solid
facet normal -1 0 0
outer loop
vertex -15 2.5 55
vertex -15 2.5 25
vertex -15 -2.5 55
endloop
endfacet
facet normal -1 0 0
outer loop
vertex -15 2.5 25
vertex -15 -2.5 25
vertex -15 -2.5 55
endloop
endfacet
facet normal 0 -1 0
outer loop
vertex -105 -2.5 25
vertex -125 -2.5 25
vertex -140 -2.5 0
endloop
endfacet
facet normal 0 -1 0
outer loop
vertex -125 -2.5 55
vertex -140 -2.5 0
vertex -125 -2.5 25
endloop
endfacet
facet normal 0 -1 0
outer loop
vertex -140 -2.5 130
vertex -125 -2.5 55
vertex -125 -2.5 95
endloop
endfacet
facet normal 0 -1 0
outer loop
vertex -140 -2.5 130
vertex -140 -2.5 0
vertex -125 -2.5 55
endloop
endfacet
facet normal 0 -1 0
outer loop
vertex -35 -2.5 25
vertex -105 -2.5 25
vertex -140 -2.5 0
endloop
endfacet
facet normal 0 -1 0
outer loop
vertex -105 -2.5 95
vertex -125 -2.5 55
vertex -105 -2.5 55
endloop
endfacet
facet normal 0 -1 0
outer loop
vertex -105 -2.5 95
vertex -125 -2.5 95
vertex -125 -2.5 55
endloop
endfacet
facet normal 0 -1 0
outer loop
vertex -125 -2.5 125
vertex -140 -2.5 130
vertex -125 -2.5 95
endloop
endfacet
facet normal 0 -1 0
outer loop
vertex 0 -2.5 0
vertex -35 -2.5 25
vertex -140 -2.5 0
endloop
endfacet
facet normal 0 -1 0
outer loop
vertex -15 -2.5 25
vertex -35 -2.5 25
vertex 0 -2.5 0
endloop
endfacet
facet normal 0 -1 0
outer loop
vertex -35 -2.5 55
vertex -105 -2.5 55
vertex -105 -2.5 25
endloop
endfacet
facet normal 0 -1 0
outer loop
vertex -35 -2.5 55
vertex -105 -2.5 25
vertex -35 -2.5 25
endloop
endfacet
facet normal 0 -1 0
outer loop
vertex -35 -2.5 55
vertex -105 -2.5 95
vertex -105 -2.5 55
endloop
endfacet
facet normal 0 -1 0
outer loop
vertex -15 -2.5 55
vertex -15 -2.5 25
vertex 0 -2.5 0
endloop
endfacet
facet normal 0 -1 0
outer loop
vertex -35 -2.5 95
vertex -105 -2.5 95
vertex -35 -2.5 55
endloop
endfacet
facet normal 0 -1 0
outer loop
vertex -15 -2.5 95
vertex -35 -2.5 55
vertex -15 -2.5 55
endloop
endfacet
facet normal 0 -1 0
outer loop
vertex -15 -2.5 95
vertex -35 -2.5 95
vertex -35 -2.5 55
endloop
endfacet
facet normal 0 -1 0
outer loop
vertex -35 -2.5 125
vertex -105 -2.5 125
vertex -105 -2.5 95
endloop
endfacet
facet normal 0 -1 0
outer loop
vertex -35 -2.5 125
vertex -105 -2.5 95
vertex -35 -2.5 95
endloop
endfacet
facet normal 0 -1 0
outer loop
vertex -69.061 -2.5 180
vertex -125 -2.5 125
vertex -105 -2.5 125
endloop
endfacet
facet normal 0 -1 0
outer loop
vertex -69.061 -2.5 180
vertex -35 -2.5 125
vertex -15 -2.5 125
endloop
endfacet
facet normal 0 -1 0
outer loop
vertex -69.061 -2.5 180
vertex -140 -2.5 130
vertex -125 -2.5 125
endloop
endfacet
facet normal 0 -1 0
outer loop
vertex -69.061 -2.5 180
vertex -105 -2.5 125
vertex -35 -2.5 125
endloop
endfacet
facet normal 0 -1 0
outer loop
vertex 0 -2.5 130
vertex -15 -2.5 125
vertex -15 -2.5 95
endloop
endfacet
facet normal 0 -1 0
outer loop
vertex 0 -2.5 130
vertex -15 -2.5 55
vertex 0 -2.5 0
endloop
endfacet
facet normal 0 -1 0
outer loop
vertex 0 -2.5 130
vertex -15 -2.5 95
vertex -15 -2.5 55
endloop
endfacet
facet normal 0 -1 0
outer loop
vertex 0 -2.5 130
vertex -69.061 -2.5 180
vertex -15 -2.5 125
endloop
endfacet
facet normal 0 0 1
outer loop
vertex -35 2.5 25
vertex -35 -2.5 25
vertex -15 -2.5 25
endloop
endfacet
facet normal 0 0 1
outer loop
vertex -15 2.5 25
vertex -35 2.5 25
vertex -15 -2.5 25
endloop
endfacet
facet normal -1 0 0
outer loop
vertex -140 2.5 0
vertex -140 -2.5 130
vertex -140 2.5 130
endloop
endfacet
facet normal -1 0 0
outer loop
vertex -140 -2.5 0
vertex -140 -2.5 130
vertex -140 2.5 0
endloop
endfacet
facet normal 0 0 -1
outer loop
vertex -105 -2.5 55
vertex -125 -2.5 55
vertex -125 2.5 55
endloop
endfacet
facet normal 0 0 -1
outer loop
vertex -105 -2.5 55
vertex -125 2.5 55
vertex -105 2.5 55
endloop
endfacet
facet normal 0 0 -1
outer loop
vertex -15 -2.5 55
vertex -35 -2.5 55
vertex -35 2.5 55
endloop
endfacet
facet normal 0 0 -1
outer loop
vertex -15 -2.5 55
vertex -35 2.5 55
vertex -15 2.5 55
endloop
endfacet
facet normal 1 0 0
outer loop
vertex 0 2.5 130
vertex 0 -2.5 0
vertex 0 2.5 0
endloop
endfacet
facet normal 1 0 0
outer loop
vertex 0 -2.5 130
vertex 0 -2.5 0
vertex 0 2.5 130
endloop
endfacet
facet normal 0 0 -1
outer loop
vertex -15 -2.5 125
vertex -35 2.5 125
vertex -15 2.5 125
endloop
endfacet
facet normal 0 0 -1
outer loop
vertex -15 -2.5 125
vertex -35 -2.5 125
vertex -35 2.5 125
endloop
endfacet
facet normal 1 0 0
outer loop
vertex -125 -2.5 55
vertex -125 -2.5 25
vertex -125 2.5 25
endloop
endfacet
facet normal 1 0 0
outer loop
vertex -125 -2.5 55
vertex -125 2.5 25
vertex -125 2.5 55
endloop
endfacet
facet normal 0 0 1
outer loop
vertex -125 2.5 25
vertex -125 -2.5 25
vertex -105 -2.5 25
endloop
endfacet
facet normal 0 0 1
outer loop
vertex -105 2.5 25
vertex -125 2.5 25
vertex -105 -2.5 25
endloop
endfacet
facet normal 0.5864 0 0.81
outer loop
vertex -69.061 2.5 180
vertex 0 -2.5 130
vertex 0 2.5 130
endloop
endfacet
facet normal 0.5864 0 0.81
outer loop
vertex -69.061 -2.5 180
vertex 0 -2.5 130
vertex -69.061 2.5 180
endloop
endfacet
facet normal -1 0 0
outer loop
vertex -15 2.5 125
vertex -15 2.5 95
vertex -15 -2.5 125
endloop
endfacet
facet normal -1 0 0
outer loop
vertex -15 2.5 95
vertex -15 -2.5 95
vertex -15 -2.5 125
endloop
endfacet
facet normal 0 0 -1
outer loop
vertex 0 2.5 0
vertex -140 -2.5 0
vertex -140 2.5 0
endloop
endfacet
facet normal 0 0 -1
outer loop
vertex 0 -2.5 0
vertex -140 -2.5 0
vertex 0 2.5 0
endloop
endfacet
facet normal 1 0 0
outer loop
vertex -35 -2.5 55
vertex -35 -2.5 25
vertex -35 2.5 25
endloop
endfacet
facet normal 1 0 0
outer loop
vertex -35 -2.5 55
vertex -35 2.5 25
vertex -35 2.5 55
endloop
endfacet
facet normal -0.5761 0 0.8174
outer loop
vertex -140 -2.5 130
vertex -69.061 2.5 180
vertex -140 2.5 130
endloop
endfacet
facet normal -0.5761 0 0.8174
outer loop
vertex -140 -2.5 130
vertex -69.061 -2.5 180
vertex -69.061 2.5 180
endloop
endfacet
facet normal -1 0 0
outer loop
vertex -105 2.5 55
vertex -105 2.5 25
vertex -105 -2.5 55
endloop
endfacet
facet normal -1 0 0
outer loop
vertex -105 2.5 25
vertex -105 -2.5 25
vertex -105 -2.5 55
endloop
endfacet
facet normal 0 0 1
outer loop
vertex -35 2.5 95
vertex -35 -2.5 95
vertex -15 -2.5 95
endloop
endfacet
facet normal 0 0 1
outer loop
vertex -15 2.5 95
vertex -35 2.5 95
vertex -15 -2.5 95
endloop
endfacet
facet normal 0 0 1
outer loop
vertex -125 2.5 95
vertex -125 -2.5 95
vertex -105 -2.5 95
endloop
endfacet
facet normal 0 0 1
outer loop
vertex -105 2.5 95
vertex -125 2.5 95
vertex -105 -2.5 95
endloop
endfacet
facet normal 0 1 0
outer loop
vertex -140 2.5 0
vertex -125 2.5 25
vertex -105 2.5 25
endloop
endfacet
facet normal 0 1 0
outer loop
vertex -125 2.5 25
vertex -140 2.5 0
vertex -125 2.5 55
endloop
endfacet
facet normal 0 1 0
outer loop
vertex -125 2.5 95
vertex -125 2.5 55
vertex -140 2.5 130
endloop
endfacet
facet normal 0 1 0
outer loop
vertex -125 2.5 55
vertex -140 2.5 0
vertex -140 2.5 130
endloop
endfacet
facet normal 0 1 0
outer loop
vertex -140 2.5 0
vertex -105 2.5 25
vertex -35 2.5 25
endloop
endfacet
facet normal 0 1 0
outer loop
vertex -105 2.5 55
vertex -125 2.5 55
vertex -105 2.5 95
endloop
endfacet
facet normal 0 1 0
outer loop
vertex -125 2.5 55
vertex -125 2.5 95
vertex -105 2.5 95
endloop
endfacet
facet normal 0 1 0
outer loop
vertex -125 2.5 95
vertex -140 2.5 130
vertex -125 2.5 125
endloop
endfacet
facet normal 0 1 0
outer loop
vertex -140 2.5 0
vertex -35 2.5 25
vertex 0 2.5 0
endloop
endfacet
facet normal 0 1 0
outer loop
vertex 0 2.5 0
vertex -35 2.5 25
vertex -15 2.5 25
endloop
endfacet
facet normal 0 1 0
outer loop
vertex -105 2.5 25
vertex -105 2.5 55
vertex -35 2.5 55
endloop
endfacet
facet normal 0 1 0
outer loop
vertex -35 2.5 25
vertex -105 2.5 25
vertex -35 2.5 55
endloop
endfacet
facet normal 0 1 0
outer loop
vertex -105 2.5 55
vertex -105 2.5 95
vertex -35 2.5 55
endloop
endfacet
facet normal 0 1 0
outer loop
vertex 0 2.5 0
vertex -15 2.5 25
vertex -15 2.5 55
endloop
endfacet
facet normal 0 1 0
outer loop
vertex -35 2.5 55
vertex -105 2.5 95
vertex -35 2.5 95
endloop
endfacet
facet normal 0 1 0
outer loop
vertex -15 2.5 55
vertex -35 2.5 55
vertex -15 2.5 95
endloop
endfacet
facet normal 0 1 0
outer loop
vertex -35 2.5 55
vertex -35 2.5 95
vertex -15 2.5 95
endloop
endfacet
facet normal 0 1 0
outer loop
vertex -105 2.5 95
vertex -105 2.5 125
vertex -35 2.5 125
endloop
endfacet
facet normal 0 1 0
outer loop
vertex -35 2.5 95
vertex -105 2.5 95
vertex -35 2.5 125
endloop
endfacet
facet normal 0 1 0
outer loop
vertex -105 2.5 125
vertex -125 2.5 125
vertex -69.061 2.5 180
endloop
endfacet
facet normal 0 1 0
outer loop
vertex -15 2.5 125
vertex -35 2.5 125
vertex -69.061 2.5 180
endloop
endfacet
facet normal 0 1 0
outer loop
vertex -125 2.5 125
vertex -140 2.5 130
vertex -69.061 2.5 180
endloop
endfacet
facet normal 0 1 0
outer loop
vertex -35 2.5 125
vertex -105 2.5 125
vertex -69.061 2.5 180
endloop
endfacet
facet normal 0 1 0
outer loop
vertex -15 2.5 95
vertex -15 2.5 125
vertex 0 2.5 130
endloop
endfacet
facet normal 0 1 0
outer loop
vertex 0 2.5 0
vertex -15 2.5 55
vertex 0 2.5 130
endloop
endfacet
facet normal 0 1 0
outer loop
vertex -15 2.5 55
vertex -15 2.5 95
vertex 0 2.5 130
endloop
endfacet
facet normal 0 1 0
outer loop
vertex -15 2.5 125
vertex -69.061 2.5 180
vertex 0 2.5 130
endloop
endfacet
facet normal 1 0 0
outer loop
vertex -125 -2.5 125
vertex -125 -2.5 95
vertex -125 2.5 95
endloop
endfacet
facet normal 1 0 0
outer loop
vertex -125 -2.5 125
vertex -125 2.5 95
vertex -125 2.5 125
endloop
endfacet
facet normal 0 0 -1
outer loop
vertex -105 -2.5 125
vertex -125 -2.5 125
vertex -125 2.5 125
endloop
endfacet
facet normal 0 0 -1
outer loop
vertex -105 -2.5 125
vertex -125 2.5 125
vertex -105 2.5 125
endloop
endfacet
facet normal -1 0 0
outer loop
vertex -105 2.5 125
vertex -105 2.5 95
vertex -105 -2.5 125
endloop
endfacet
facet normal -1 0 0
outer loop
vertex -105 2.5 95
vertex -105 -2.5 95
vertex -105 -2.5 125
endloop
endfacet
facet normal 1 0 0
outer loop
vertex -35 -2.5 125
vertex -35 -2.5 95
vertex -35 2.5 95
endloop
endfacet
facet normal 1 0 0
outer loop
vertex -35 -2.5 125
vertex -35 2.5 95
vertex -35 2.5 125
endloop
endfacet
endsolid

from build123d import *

# Parameters (mm, degrees)
F0_W     = 140
F0_H     = 80
F0_W_2   = 20
F0_H_2   = 30
F1_DEPTH = 2.5


with BuildPart() as f1:
    # F0 (on Front) → F1 (new body, symmetric)
    with BuildSketch(Plane.XZ):
        with Locations((-70, 40)):
            Rectangle(F0_W, F0_H)
        with Locations((-115, 40)):
            Rectangle(F0_W_2, F0_H_2, mode=Mode.SUBTRACT)
        with Locations((-25, 40)):
            Rectangle(F0_W_2, F0_H_2, mode=Mode.SUBTRACT)
        Polygon((-140, 80), (0, 80), (0, 130), (-69.061231, 180), (-140, 130), align=None)
        with Locations((-115, 110)):
            Rectangle(F0_W_2, F0_H_2, mode=Mode.SUBTRACT)
        with Locations((-25, 110)):
            Rectangle(F0_W_2, F0_H_2, mode=Mode.SUBTRACT)
    extrude(amount=F1_DEPTH, both=True)


solid = f1.part
